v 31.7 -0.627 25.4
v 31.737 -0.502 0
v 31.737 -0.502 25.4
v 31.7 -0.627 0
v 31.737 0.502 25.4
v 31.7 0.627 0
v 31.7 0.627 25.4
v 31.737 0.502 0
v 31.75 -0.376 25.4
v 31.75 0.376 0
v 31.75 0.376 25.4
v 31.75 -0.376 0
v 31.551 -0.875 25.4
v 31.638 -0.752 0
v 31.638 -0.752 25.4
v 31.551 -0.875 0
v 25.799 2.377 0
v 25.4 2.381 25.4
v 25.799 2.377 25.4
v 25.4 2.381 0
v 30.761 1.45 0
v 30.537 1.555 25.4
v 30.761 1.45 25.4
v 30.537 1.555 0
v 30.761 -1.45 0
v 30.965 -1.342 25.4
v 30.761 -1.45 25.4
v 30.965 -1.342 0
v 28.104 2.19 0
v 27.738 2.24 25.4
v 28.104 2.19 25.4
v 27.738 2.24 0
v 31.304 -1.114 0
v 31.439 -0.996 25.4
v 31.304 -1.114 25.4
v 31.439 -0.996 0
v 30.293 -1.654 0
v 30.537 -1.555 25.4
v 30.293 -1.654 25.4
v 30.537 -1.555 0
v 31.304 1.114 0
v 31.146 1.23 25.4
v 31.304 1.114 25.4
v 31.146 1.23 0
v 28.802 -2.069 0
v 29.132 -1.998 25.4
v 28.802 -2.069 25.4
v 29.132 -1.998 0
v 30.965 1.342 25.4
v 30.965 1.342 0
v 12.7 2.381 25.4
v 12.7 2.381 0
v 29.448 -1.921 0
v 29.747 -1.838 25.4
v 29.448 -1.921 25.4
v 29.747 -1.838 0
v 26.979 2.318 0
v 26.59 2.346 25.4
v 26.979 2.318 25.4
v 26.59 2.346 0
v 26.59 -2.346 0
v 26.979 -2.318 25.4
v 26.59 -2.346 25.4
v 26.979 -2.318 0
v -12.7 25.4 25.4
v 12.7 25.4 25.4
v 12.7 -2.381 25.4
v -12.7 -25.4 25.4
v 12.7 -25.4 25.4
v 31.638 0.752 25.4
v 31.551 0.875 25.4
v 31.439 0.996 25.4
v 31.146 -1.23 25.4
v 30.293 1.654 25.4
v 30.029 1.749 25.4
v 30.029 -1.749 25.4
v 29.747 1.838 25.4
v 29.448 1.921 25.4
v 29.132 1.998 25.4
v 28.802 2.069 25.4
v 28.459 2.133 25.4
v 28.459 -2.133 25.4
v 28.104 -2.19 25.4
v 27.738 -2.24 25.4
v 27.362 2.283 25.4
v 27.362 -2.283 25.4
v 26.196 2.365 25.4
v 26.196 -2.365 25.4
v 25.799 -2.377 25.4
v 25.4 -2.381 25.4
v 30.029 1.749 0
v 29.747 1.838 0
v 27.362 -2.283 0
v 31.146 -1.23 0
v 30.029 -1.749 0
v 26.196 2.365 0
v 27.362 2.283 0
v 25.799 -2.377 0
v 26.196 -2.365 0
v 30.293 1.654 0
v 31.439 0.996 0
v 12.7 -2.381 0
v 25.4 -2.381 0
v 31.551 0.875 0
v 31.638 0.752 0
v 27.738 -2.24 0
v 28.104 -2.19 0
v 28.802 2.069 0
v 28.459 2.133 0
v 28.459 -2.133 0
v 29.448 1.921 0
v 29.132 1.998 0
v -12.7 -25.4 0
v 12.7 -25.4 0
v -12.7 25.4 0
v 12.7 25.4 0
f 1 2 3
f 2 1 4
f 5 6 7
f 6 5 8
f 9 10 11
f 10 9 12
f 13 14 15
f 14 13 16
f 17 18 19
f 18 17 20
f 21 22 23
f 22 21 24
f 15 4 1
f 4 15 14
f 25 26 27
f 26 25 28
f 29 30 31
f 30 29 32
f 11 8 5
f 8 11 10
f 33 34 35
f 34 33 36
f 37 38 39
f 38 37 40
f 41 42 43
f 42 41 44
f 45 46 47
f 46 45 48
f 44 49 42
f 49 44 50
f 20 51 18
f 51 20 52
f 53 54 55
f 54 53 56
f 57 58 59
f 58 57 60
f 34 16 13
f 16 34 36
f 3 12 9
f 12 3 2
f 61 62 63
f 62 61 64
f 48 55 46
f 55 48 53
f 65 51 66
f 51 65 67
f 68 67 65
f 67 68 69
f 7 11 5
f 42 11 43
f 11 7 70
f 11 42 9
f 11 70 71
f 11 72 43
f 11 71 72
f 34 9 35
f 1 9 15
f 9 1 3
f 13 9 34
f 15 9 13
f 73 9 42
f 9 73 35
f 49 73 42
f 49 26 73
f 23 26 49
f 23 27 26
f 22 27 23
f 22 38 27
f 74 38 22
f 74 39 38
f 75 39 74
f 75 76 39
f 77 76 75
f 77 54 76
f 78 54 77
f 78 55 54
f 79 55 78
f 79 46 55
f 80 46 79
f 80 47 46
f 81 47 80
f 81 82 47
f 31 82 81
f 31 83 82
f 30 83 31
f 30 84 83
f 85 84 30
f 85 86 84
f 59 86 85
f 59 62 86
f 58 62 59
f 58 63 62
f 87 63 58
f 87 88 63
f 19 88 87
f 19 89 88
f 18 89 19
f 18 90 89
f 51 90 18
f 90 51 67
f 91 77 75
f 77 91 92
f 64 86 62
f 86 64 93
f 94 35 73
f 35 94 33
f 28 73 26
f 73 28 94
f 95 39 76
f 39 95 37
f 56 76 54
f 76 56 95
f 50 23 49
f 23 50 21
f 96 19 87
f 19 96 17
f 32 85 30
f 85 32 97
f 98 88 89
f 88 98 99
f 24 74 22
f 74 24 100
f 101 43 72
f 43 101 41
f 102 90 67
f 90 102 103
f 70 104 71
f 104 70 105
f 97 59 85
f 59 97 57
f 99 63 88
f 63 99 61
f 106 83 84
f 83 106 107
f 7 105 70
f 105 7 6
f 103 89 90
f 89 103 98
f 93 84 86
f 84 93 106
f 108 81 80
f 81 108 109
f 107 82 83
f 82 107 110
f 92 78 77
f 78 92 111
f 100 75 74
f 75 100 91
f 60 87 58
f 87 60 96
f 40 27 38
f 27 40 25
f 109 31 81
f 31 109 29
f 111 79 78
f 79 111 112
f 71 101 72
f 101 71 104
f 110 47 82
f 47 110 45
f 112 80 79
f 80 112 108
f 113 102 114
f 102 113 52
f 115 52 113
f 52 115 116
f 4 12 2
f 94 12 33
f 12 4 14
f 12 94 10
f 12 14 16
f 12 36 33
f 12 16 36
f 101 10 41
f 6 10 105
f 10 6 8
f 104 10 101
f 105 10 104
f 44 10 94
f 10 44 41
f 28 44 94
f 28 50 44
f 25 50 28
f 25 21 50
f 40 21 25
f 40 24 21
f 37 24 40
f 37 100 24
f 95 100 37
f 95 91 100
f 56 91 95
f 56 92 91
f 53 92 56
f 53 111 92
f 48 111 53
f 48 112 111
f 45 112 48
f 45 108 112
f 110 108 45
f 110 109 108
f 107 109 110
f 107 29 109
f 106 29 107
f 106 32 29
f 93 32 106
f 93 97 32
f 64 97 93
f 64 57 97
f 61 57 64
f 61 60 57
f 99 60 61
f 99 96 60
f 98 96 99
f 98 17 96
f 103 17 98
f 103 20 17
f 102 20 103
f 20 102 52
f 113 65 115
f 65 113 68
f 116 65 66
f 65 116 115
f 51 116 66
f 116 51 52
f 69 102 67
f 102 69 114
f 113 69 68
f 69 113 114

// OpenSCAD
/*
Description : File for building parts used in deck assembly
*/

/*****************************************************************************
CONSTANTS
*****************************************************************************/
$fn=100;
PI = 4 * atan2(1,1);
INCH = 25.4;
THREE_SIXTEENTHS_INCH = 4.7625;
QUARTER_INCH = 6.35;
DECKING_GAP = THREE_SIXTEENTHS_INCH;
WALL_GAP = INCH / 2;

/*****************************************************************************
FUNCTIONS - code to make reading modules easier to understand.
******************************************************************************/
function half(x) = x/2;

/*****************************************************************************
Directives - defines what to build with optional features.
*****************************************************************************/
INCLUDE_THING = 0;
BUILD_THING = 1;
BUILD_DECKING_GAP_SPACER = 1;
BUILD_WALL_GAP_SPACER = 0;

/*****************************************************************************
MAIN SUB - where the instructions start.
*****************************************************************************/
build();

/*****************************************************************************
MODULES: - the meat of the project.
*****************************************************************************/
module build()
{
    if (BUILD_DECKING_GAP_SPACER) 
    {
        decking_gap_spacer();

    }
    else if(BUILD_WALL_GAP_SPACER)
    {
        Wall_gap_spacer();
        // translate([INCH,0,0])
        // rotate([90,0,0])
        // #cylinder(r=1, h=WALL_GAP, center=true);
    }
}

module decking_gap_spacer()
{
    //spacer to fit in between boards.
    translate([INCH * 0.75, 0, 0]) 
    // rotate([90, 0, 0]) 
    linear_extrude(height = INCH, slices = 60) 
    resize([INCH, DECKING_GAP, 0], auto = [false,true,false])
    offset( r = half(INCH), chamfer =false) 
    square(size=[INCH, DECKING_GAP], center=true);

    //handle to grip with
    linear_extrude(height = INCH) square(size=[INCH, 2*INCH], center=true);
}

module Wall_gap_spacer()
{
    //spacer to fit in between boards.
    translate([INCH * 0.75, 0, 0]) 
    // rotate([90, 0, 0]) 
    linear_extrude(height = INCH, slices = 60) 
    resize([INCH,WALL_GAP,0], auto = [true,true,false])
    offset( r = half(INCH), chamfer =false) 
    square(size=[INCH, WALL_GAP], center=true);

    //handle to grip with
    translate([0, half(1.5*INCH) - half(WALL_GAP), 0]) 
    linear_extrude(height = INCH) square(size=[INCH, 1.5*INCH], center=true);
}
